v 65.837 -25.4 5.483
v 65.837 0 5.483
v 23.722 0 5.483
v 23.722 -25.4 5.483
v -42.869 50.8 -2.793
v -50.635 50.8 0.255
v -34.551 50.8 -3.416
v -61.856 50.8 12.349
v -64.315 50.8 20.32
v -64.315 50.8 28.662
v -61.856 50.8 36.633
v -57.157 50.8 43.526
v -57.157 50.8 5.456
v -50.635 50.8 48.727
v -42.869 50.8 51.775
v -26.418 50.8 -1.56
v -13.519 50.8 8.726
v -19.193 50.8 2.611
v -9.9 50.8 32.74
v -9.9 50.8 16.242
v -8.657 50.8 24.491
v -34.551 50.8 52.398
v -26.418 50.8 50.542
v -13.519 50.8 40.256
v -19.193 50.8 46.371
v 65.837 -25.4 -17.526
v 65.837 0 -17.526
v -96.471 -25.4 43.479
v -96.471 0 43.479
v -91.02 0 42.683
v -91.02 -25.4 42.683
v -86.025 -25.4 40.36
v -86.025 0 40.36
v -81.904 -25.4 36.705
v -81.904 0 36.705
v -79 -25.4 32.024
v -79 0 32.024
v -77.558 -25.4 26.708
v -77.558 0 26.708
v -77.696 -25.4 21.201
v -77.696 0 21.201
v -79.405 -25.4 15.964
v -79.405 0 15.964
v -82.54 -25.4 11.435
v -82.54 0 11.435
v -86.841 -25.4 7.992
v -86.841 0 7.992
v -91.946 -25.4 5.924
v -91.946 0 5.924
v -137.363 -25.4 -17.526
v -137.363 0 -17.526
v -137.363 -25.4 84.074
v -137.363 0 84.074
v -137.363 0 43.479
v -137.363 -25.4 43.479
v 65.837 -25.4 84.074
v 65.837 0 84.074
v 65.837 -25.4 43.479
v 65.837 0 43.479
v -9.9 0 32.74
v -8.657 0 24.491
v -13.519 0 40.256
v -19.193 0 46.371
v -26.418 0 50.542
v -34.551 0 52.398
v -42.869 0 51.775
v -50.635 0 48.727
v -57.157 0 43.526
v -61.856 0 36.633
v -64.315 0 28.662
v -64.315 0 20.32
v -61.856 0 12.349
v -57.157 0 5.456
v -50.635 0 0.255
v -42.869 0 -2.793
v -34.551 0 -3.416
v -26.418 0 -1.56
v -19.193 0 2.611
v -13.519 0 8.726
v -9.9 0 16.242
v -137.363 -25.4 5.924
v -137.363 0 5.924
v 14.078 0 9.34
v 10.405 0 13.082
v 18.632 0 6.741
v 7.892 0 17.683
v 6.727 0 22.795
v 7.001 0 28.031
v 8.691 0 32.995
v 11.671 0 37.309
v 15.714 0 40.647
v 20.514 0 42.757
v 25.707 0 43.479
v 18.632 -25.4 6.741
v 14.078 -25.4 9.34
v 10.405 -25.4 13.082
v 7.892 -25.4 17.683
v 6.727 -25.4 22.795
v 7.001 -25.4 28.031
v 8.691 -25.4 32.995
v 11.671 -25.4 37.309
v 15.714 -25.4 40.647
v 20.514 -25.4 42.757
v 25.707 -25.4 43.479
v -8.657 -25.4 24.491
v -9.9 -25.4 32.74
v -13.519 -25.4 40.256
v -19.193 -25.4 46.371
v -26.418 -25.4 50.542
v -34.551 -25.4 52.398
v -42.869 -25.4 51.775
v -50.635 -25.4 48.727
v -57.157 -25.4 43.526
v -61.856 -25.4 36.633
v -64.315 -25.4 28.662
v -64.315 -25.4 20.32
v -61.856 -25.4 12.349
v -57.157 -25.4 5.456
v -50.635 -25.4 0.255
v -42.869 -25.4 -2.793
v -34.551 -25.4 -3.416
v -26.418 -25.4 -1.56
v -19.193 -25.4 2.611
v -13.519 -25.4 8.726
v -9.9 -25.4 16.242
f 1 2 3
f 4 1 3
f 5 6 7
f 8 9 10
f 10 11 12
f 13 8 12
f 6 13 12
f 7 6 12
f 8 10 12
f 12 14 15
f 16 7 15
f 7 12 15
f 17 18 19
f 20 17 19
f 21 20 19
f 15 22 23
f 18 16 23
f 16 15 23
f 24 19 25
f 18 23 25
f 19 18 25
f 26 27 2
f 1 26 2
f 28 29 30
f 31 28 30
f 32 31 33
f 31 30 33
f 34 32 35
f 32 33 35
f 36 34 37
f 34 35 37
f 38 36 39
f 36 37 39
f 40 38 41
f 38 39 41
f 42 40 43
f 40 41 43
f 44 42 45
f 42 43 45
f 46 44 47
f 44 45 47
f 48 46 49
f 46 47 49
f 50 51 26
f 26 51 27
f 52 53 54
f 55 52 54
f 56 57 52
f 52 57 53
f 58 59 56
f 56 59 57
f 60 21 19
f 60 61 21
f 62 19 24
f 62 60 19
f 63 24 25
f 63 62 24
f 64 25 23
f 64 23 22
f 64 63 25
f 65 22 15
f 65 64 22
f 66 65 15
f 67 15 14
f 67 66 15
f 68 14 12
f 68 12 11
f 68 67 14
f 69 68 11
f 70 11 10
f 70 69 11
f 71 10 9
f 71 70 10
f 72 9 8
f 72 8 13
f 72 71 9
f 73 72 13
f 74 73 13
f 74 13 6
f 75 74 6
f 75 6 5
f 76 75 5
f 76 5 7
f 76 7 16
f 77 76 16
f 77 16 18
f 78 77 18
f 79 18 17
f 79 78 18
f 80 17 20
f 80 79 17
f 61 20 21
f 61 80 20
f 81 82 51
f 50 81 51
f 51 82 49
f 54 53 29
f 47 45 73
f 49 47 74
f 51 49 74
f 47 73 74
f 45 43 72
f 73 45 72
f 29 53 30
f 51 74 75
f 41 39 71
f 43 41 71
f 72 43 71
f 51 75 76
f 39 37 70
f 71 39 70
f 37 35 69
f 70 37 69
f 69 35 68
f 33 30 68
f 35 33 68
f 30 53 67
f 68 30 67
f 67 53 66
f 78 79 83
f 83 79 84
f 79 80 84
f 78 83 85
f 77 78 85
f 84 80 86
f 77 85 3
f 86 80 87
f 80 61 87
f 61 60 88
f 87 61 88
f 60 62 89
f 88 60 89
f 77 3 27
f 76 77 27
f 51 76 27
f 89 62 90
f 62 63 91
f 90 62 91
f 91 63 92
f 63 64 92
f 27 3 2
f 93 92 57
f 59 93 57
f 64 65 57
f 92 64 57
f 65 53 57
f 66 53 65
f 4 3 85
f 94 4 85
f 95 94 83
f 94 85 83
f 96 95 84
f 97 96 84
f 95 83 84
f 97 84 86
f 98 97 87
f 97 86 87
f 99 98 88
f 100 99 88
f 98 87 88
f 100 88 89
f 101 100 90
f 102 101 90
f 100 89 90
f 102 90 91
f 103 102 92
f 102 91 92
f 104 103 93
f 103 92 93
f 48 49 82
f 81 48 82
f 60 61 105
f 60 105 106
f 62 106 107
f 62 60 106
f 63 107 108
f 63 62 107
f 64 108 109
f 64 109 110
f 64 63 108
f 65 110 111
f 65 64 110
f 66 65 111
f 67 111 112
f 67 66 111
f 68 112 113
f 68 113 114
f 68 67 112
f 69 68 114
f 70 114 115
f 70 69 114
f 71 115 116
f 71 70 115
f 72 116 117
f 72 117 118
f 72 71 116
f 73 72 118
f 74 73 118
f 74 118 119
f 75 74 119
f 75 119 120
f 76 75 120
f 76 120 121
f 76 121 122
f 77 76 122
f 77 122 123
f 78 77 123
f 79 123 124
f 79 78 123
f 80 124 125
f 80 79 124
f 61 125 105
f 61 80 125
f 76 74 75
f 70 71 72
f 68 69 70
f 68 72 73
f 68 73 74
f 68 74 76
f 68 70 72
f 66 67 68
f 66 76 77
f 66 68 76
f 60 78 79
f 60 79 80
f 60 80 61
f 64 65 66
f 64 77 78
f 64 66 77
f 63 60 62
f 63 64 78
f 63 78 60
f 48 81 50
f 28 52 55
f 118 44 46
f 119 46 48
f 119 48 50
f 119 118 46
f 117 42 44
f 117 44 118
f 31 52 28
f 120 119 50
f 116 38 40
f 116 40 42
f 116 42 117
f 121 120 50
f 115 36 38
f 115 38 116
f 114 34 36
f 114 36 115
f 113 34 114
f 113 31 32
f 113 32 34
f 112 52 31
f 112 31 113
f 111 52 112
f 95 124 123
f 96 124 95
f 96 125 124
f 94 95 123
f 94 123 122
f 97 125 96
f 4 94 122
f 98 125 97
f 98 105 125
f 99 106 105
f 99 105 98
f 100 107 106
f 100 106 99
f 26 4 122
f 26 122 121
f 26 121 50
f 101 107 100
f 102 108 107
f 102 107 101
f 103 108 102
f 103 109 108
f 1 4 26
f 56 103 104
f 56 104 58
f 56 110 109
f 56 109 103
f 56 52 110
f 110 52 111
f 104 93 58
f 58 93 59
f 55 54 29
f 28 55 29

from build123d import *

# Parameters (mm, degrees)
F0_R     = 27.9852612084
F1_DEPTH = 25.4
F2_DEPTH = 25.4
F3_DEPTH = 25.4


with BuildPart() as f1:
    # F0 (on Front) → F1 (new body)
    with BuildSketch(Plane.XZ):
        with BuildLine():
            Line((65.836802125, 84.0739992619), (-137.363197875, 84.0739992619))
            Line((-137.363197875, 84.0739992619), (-137.363197875, 43.4789583087))
            Line((-137.363197875, 43.4789583087), (-96.4707667423, 43.4789583087))
            ThreePointArc((-96.4707667423, 43.4789583087), (-77.5575271333, 26.707525291), (-91.9463485479, 5.9240362607))
            Line((-91.9463485479, 5.9240362607), (-137.363197875, 5.9240362607))
            Line((-137.363197875, 5.9240362607), (-137.363197875, -17.5260007381))
            Line((-137.363197875, -17.5260007381), (65.836802125, -17.5260007381))
            Line((65.836802125, -17.5260007381), (65.836802125, 5.4826620035))
            Line((65.836802125, 5.4826620035), (23.7221289426, 5.4826620035))
            ThreePointArc((23.7221289426, 5.4826620035), (6.6831056088, 25.422828367), (25.7071620192, 43.4789583087))
            Line((25.7071620192, 43.4789583087), (65.836802125, 43.4789583087))
            Line((65.836802125, 43.4789583087), (65.836802125, 84.0739992619))
        make_face()
        with Locations((-36.6418771446, 24.4909115136)):
            Circle(F0_R, mode=Mode.SUBTRACT)
    extrude(amount=F1_DEPTH)

    # F0 (on Front) → F2 (join)
    with BuildSketch(Plane.XZ):
        with Locations((-36.6418771446, 24.4909115136)):
            Circle(F0_R)
    extrude(amount=-F2_DEPTH)

    # F3 (add): a face of the model
    f3_faces = [f1.faces().sort_by_distance(p)[0] for p in [
        (-36.6418771446, 25.4, 24.4909115136),
    ]]
    extrude(f3_faces, amount=F3_DEPTH)


solid = f1.part
